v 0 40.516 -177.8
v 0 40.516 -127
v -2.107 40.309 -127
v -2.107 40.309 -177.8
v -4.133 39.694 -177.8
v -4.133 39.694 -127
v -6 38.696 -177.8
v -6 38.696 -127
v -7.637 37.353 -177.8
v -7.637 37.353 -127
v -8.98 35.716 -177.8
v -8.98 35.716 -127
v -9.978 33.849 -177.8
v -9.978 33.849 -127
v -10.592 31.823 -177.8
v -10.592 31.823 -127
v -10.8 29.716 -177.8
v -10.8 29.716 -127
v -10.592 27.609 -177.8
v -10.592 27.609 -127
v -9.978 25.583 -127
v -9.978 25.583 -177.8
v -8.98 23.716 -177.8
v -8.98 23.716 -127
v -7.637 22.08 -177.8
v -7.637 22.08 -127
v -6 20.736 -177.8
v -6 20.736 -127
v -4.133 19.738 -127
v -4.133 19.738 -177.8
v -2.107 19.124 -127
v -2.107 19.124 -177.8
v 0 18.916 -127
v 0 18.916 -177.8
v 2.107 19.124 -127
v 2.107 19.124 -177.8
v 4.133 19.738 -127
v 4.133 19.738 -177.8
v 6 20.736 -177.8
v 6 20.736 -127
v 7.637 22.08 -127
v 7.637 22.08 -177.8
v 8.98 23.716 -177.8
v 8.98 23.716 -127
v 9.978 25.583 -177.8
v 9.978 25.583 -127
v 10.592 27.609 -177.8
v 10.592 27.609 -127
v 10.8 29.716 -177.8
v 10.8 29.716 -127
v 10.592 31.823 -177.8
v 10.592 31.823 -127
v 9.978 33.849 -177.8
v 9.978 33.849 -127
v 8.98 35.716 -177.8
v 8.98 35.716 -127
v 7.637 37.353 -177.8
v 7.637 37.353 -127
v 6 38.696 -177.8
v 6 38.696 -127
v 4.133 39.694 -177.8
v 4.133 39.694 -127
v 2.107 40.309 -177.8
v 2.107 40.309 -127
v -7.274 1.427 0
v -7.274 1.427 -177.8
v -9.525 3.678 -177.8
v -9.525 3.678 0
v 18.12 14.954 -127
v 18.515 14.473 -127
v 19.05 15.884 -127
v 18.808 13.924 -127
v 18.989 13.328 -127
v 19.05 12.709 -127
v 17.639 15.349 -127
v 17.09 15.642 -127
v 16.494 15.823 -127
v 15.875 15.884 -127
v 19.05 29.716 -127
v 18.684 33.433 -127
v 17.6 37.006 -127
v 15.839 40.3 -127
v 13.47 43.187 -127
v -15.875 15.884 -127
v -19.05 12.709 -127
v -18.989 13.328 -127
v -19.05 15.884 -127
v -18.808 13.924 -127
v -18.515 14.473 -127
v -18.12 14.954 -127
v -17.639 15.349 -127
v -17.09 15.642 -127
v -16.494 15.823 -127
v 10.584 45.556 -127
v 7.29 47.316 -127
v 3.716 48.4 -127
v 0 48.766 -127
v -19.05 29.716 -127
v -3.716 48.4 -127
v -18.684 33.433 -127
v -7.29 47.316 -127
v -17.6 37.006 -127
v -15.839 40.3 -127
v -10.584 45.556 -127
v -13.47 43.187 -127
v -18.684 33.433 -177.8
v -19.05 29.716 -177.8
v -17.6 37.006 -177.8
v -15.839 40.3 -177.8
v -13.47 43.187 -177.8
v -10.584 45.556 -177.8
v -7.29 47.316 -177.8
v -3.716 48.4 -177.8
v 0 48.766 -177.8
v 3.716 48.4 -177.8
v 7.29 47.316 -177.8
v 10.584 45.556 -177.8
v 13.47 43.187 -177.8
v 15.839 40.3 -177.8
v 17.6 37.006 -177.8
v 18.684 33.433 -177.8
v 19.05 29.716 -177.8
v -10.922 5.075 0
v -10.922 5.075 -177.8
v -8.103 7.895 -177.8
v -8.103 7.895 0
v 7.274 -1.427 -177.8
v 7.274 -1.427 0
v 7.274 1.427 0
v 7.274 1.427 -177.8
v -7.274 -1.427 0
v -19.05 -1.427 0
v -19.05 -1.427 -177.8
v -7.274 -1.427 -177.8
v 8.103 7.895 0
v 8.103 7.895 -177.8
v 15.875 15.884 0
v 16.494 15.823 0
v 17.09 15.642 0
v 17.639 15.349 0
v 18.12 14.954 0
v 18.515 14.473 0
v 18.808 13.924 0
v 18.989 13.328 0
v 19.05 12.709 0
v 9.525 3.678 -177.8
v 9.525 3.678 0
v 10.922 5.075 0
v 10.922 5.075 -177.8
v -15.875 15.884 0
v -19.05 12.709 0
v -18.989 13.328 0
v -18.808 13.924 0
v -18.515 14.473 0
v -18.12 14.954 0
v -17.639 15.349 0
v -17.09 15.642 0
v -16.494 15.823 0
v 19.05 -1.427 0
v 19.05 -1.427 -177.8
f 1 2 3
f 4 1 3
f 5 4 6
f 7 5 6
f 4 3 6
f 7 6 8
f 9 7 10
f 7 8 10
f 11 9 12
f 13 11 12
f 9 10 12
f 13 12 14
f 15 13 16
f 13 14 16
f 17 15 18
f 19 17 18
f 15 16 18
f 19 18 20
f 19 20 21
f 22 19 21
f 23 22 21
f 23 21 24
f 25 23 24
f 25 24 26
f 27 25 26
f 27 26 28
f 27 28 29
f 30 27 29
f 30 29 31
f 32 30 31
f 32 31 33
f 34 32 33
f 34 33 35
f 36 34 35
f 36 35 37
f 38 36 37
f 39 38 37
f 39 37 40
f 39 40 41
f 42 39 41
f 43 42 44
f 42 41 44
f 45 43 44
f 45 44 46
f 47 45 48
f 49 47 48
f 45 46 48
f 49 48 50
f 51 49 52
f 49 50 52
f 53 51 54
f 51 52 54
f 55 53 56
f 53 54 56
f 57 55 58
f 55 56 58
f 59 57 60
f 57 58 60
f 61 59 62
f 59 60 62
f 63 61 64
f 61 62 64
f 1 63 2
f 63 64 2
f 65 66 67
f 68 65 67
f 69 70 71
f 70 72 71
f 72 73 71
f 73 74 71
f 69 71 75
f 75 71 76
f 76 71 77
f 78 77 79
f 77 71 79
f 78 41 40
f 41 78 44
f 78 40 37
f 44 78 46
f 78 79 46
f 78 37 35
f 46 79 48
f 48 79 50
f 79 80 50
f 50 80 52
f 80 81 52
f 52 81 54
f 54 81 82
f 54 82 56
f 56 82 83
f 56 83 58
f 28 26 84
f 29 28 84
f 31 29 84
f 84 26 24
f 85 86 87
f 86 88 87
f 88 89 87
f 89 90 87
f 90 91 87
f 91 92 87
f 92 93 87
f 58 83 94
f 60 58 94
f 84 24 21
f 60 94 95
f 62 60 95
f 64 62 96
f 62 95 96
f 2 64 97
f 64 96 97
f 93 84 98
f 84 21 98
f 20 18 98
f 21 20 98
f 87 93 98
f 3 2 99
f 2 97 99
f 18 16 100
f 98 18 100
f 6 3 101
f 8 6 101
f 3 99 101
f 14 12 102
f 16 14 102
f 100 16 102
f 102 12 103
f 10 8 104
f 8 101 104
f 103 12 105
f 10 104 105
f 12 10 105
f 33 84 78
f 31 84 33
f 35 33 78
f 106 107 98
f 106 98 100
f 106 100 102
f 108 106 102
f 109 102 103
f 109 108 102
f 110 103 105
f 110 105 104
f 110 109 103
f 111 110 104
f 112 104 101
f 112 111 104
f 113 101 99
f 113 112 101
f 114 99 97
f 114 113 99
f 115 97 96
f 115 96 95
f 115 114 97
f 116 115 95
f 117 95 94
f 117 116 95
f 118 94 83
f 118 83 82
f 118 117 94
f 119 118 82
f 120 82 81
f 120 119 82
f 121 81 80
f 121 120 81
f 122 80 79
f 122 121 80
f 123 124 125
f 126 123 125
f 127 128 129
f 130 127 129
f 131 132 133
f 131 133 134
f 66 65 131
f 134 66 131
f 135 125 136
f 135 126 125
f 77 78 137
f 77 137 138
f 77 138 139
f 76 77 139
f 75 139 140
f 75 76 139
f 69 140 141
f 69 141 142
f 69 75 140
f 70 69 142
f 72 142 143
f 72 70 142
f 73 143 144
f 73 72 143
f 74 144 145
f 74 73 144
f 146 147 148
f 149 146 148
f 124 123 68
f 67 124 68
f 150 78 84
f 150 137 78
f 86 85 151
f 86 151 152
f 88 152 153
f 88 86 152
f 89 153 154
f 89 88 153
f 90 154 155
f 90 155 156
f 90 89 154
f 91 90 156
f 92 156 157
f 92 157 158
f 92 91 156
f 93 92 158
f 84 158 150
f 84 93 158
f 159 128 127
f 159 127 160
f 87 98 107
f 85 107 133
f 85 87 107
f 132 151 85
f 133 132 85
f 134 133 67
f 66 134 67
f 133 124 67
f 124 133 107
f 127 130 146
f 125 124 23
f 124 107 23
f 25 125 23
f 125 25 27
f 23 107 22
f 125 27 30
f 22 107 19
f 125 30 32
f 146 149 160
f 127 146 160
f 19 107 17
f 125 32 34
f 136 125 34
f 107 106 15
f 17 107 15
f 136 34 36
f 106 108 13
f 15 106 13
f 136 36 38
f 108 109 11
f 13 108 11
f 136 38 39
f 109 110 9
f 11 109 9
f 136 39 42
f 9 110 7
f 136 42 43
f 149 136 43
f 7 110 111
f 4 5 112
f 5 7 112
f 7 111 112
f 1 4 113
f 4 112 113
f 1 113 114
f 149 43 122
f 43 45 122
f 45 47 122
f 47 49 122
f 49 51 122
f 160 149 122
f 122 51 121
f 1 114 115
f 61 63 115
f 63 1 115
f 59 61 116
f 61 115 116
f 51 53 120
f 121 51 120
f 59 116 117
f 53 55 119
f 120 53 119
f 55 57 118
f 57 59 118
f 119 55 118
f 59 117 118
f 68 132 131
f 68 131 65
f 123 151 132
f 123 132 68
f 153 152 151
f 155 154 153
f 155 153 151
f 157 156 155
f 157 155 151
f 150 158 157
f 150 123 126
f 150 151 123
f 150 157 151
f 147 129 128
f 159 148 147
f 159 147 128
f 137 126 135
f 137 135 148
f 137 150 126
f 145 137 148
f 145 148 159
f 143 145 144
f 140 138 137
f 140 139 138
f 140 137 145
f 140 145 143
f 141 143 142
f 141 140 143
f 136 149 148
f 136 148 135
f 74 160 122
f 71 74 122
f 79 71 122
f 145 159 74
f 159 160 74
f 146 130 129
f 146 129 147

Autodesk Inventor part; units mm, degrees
ref_plane "YZ Plane" through (0, 0, 0) normal (1, 0, 0) x (0, 1, 0)
ref_plane "XZ Plane" through (0, 0, 0) normal (0, 1, 0) x (-1, 0, 0)
ref_plane "XY Plane" through (0, 0, 0) normal (0, 0, 1) x (1, 0, 0)
sketch "Sketch1" plane through (0, 0, 0) normal (0, 0, 1) x (1, 0, 0)
  line L0 (-7.2739, -1.4271) -> (7.2739, -1.4271)
  line L1 (7.2739, -1.4271) -> (7.2739, 1.4271)
  line L2 (7.2739, 1.4271) -> (-7.2739, 1.4271)
  line L3 (-7.2739, 1.4271) -> (-7.2739, -1.4271)
  line L4 (-7.2739, -1.4271) -> (7.2739, 1.4271) construction
  line L5 (7.2739, -1.4271) -> (-7.2739, 1.4271) construction
  line L6 (9.525, 3.6783) -> (-9.525, 3.6783)
  line L7 (-9.525, 3.6783) -> (-9.525, 6.4723)
  line L8 (-9.525, 6.4723) -> (9.525, 6.4723)
  line L9 (9.525, 6.4723) -> (9.525, 3.6783)
  line L10 (9.525, 3.6783) -> (-9.525, 6.4723) construction
  line L11 (-9.525, 3.6783) -> (9.525, 6.4723) construction
  line L12 (-7.2739, 1.4271) -> (-9.525, 3.6783)
  line L13 (7.2739, 1.4271) -> (9.525, 3.6783)
  line L14 (-10.922, 5.0753) -> (-8.1026, 7.8947)
  line L15 (-10.922, 5.0753) -> (-6.9348, 5.0753) construction
  line L16 (-10.922, 5.0753) -> (-9.525, 3.6783)
  line L17 (10.922, 5.0753) -> (8.1026, 7.8947)
  line L18 (9.525, 3.6783) -> (10.922, 5.0753)
  line L19 (-8.1026, 7.8947) -> (8.1026, 7.8947)
  line L20 (-19.05, -1.4271) -> (19.05, -1.4271)
  line L21 (19.05, -1.4271) -> (19.05, 15.8839)
  line L22 (19.05, 15.8839) -> (-19.05, 15.8839)
  line L23 (-19.05, 15.8839) -> (-19.05, -1.4271)
  point P0 (0, 0)
  point P1 (0, 5.0753)
  point P2 (0, -1.4271)
  dimension "d0" = 135
  dimension "d1" = 135
  dimension "d2" = 19.05
  dimension "d3" = 2.794
  dimension "d4" = 45
  dimension "d5" = 4.2164
  dimension "d6" = 90
  dimension "d7" = 90
  dimension "d8" = 9.3218
  dimension "d9" = 38.1
extrude "Extrusion1" add sketch "Sketch1" against normal blind 177.8 contours L20 L23 L22 L21 L1 L13 L18 L17 L19 L14 L16 L12 L3
sketch "Sketch2" plane through (0, 0, -177.8) normal (0, 0, -1) x (-1, 0, 0)
  arc A0 (19.05, 29.7163) -> (-19.05, 29.7163) centre (0, 29.7163) ccw
  line L0 (19.05, -1.4271) -> (19.05, 15.8839) projected
  line L1 (19.05, 15.8839) -> (19.05, -1.4271) projected
  line L2 (19.05, 15.8839) -> (19.05, 29.7163)
  line L3 (-19.05, -1.4271) -> (-19.05, 15.8839) projected
  line L4 (-19.05, 15.8839) -> (-19.05, 29.7163)
  line L5 (19.05, 15.8839) -> (-19.05, 15.8839)
  point P0 (0, 0)
extrude "Extrusion2" add sketch "Sketch2" against normal blind 50.8
sketch "Sketch3" plane through (0, 0, -177.8) normal (0, 0, -1) x (-1, 0, 0)
  arc A0 (19.05, 29.7163) -> (-19.05, 29.7163) centre (0, 29.7163) ccw projected
  point P0 (0, 0)
hole "Hole1" at (0, 29.7163, -177.8) direction (0, 0, 1) diameter 21.6 end through all
fillet "Fillet1" radius 3.175 2 edges at (-19.05, 15.8839, -63.5) (19.05, 15.8839, -63.5)
properties part number "Laser mount 7 inches"
